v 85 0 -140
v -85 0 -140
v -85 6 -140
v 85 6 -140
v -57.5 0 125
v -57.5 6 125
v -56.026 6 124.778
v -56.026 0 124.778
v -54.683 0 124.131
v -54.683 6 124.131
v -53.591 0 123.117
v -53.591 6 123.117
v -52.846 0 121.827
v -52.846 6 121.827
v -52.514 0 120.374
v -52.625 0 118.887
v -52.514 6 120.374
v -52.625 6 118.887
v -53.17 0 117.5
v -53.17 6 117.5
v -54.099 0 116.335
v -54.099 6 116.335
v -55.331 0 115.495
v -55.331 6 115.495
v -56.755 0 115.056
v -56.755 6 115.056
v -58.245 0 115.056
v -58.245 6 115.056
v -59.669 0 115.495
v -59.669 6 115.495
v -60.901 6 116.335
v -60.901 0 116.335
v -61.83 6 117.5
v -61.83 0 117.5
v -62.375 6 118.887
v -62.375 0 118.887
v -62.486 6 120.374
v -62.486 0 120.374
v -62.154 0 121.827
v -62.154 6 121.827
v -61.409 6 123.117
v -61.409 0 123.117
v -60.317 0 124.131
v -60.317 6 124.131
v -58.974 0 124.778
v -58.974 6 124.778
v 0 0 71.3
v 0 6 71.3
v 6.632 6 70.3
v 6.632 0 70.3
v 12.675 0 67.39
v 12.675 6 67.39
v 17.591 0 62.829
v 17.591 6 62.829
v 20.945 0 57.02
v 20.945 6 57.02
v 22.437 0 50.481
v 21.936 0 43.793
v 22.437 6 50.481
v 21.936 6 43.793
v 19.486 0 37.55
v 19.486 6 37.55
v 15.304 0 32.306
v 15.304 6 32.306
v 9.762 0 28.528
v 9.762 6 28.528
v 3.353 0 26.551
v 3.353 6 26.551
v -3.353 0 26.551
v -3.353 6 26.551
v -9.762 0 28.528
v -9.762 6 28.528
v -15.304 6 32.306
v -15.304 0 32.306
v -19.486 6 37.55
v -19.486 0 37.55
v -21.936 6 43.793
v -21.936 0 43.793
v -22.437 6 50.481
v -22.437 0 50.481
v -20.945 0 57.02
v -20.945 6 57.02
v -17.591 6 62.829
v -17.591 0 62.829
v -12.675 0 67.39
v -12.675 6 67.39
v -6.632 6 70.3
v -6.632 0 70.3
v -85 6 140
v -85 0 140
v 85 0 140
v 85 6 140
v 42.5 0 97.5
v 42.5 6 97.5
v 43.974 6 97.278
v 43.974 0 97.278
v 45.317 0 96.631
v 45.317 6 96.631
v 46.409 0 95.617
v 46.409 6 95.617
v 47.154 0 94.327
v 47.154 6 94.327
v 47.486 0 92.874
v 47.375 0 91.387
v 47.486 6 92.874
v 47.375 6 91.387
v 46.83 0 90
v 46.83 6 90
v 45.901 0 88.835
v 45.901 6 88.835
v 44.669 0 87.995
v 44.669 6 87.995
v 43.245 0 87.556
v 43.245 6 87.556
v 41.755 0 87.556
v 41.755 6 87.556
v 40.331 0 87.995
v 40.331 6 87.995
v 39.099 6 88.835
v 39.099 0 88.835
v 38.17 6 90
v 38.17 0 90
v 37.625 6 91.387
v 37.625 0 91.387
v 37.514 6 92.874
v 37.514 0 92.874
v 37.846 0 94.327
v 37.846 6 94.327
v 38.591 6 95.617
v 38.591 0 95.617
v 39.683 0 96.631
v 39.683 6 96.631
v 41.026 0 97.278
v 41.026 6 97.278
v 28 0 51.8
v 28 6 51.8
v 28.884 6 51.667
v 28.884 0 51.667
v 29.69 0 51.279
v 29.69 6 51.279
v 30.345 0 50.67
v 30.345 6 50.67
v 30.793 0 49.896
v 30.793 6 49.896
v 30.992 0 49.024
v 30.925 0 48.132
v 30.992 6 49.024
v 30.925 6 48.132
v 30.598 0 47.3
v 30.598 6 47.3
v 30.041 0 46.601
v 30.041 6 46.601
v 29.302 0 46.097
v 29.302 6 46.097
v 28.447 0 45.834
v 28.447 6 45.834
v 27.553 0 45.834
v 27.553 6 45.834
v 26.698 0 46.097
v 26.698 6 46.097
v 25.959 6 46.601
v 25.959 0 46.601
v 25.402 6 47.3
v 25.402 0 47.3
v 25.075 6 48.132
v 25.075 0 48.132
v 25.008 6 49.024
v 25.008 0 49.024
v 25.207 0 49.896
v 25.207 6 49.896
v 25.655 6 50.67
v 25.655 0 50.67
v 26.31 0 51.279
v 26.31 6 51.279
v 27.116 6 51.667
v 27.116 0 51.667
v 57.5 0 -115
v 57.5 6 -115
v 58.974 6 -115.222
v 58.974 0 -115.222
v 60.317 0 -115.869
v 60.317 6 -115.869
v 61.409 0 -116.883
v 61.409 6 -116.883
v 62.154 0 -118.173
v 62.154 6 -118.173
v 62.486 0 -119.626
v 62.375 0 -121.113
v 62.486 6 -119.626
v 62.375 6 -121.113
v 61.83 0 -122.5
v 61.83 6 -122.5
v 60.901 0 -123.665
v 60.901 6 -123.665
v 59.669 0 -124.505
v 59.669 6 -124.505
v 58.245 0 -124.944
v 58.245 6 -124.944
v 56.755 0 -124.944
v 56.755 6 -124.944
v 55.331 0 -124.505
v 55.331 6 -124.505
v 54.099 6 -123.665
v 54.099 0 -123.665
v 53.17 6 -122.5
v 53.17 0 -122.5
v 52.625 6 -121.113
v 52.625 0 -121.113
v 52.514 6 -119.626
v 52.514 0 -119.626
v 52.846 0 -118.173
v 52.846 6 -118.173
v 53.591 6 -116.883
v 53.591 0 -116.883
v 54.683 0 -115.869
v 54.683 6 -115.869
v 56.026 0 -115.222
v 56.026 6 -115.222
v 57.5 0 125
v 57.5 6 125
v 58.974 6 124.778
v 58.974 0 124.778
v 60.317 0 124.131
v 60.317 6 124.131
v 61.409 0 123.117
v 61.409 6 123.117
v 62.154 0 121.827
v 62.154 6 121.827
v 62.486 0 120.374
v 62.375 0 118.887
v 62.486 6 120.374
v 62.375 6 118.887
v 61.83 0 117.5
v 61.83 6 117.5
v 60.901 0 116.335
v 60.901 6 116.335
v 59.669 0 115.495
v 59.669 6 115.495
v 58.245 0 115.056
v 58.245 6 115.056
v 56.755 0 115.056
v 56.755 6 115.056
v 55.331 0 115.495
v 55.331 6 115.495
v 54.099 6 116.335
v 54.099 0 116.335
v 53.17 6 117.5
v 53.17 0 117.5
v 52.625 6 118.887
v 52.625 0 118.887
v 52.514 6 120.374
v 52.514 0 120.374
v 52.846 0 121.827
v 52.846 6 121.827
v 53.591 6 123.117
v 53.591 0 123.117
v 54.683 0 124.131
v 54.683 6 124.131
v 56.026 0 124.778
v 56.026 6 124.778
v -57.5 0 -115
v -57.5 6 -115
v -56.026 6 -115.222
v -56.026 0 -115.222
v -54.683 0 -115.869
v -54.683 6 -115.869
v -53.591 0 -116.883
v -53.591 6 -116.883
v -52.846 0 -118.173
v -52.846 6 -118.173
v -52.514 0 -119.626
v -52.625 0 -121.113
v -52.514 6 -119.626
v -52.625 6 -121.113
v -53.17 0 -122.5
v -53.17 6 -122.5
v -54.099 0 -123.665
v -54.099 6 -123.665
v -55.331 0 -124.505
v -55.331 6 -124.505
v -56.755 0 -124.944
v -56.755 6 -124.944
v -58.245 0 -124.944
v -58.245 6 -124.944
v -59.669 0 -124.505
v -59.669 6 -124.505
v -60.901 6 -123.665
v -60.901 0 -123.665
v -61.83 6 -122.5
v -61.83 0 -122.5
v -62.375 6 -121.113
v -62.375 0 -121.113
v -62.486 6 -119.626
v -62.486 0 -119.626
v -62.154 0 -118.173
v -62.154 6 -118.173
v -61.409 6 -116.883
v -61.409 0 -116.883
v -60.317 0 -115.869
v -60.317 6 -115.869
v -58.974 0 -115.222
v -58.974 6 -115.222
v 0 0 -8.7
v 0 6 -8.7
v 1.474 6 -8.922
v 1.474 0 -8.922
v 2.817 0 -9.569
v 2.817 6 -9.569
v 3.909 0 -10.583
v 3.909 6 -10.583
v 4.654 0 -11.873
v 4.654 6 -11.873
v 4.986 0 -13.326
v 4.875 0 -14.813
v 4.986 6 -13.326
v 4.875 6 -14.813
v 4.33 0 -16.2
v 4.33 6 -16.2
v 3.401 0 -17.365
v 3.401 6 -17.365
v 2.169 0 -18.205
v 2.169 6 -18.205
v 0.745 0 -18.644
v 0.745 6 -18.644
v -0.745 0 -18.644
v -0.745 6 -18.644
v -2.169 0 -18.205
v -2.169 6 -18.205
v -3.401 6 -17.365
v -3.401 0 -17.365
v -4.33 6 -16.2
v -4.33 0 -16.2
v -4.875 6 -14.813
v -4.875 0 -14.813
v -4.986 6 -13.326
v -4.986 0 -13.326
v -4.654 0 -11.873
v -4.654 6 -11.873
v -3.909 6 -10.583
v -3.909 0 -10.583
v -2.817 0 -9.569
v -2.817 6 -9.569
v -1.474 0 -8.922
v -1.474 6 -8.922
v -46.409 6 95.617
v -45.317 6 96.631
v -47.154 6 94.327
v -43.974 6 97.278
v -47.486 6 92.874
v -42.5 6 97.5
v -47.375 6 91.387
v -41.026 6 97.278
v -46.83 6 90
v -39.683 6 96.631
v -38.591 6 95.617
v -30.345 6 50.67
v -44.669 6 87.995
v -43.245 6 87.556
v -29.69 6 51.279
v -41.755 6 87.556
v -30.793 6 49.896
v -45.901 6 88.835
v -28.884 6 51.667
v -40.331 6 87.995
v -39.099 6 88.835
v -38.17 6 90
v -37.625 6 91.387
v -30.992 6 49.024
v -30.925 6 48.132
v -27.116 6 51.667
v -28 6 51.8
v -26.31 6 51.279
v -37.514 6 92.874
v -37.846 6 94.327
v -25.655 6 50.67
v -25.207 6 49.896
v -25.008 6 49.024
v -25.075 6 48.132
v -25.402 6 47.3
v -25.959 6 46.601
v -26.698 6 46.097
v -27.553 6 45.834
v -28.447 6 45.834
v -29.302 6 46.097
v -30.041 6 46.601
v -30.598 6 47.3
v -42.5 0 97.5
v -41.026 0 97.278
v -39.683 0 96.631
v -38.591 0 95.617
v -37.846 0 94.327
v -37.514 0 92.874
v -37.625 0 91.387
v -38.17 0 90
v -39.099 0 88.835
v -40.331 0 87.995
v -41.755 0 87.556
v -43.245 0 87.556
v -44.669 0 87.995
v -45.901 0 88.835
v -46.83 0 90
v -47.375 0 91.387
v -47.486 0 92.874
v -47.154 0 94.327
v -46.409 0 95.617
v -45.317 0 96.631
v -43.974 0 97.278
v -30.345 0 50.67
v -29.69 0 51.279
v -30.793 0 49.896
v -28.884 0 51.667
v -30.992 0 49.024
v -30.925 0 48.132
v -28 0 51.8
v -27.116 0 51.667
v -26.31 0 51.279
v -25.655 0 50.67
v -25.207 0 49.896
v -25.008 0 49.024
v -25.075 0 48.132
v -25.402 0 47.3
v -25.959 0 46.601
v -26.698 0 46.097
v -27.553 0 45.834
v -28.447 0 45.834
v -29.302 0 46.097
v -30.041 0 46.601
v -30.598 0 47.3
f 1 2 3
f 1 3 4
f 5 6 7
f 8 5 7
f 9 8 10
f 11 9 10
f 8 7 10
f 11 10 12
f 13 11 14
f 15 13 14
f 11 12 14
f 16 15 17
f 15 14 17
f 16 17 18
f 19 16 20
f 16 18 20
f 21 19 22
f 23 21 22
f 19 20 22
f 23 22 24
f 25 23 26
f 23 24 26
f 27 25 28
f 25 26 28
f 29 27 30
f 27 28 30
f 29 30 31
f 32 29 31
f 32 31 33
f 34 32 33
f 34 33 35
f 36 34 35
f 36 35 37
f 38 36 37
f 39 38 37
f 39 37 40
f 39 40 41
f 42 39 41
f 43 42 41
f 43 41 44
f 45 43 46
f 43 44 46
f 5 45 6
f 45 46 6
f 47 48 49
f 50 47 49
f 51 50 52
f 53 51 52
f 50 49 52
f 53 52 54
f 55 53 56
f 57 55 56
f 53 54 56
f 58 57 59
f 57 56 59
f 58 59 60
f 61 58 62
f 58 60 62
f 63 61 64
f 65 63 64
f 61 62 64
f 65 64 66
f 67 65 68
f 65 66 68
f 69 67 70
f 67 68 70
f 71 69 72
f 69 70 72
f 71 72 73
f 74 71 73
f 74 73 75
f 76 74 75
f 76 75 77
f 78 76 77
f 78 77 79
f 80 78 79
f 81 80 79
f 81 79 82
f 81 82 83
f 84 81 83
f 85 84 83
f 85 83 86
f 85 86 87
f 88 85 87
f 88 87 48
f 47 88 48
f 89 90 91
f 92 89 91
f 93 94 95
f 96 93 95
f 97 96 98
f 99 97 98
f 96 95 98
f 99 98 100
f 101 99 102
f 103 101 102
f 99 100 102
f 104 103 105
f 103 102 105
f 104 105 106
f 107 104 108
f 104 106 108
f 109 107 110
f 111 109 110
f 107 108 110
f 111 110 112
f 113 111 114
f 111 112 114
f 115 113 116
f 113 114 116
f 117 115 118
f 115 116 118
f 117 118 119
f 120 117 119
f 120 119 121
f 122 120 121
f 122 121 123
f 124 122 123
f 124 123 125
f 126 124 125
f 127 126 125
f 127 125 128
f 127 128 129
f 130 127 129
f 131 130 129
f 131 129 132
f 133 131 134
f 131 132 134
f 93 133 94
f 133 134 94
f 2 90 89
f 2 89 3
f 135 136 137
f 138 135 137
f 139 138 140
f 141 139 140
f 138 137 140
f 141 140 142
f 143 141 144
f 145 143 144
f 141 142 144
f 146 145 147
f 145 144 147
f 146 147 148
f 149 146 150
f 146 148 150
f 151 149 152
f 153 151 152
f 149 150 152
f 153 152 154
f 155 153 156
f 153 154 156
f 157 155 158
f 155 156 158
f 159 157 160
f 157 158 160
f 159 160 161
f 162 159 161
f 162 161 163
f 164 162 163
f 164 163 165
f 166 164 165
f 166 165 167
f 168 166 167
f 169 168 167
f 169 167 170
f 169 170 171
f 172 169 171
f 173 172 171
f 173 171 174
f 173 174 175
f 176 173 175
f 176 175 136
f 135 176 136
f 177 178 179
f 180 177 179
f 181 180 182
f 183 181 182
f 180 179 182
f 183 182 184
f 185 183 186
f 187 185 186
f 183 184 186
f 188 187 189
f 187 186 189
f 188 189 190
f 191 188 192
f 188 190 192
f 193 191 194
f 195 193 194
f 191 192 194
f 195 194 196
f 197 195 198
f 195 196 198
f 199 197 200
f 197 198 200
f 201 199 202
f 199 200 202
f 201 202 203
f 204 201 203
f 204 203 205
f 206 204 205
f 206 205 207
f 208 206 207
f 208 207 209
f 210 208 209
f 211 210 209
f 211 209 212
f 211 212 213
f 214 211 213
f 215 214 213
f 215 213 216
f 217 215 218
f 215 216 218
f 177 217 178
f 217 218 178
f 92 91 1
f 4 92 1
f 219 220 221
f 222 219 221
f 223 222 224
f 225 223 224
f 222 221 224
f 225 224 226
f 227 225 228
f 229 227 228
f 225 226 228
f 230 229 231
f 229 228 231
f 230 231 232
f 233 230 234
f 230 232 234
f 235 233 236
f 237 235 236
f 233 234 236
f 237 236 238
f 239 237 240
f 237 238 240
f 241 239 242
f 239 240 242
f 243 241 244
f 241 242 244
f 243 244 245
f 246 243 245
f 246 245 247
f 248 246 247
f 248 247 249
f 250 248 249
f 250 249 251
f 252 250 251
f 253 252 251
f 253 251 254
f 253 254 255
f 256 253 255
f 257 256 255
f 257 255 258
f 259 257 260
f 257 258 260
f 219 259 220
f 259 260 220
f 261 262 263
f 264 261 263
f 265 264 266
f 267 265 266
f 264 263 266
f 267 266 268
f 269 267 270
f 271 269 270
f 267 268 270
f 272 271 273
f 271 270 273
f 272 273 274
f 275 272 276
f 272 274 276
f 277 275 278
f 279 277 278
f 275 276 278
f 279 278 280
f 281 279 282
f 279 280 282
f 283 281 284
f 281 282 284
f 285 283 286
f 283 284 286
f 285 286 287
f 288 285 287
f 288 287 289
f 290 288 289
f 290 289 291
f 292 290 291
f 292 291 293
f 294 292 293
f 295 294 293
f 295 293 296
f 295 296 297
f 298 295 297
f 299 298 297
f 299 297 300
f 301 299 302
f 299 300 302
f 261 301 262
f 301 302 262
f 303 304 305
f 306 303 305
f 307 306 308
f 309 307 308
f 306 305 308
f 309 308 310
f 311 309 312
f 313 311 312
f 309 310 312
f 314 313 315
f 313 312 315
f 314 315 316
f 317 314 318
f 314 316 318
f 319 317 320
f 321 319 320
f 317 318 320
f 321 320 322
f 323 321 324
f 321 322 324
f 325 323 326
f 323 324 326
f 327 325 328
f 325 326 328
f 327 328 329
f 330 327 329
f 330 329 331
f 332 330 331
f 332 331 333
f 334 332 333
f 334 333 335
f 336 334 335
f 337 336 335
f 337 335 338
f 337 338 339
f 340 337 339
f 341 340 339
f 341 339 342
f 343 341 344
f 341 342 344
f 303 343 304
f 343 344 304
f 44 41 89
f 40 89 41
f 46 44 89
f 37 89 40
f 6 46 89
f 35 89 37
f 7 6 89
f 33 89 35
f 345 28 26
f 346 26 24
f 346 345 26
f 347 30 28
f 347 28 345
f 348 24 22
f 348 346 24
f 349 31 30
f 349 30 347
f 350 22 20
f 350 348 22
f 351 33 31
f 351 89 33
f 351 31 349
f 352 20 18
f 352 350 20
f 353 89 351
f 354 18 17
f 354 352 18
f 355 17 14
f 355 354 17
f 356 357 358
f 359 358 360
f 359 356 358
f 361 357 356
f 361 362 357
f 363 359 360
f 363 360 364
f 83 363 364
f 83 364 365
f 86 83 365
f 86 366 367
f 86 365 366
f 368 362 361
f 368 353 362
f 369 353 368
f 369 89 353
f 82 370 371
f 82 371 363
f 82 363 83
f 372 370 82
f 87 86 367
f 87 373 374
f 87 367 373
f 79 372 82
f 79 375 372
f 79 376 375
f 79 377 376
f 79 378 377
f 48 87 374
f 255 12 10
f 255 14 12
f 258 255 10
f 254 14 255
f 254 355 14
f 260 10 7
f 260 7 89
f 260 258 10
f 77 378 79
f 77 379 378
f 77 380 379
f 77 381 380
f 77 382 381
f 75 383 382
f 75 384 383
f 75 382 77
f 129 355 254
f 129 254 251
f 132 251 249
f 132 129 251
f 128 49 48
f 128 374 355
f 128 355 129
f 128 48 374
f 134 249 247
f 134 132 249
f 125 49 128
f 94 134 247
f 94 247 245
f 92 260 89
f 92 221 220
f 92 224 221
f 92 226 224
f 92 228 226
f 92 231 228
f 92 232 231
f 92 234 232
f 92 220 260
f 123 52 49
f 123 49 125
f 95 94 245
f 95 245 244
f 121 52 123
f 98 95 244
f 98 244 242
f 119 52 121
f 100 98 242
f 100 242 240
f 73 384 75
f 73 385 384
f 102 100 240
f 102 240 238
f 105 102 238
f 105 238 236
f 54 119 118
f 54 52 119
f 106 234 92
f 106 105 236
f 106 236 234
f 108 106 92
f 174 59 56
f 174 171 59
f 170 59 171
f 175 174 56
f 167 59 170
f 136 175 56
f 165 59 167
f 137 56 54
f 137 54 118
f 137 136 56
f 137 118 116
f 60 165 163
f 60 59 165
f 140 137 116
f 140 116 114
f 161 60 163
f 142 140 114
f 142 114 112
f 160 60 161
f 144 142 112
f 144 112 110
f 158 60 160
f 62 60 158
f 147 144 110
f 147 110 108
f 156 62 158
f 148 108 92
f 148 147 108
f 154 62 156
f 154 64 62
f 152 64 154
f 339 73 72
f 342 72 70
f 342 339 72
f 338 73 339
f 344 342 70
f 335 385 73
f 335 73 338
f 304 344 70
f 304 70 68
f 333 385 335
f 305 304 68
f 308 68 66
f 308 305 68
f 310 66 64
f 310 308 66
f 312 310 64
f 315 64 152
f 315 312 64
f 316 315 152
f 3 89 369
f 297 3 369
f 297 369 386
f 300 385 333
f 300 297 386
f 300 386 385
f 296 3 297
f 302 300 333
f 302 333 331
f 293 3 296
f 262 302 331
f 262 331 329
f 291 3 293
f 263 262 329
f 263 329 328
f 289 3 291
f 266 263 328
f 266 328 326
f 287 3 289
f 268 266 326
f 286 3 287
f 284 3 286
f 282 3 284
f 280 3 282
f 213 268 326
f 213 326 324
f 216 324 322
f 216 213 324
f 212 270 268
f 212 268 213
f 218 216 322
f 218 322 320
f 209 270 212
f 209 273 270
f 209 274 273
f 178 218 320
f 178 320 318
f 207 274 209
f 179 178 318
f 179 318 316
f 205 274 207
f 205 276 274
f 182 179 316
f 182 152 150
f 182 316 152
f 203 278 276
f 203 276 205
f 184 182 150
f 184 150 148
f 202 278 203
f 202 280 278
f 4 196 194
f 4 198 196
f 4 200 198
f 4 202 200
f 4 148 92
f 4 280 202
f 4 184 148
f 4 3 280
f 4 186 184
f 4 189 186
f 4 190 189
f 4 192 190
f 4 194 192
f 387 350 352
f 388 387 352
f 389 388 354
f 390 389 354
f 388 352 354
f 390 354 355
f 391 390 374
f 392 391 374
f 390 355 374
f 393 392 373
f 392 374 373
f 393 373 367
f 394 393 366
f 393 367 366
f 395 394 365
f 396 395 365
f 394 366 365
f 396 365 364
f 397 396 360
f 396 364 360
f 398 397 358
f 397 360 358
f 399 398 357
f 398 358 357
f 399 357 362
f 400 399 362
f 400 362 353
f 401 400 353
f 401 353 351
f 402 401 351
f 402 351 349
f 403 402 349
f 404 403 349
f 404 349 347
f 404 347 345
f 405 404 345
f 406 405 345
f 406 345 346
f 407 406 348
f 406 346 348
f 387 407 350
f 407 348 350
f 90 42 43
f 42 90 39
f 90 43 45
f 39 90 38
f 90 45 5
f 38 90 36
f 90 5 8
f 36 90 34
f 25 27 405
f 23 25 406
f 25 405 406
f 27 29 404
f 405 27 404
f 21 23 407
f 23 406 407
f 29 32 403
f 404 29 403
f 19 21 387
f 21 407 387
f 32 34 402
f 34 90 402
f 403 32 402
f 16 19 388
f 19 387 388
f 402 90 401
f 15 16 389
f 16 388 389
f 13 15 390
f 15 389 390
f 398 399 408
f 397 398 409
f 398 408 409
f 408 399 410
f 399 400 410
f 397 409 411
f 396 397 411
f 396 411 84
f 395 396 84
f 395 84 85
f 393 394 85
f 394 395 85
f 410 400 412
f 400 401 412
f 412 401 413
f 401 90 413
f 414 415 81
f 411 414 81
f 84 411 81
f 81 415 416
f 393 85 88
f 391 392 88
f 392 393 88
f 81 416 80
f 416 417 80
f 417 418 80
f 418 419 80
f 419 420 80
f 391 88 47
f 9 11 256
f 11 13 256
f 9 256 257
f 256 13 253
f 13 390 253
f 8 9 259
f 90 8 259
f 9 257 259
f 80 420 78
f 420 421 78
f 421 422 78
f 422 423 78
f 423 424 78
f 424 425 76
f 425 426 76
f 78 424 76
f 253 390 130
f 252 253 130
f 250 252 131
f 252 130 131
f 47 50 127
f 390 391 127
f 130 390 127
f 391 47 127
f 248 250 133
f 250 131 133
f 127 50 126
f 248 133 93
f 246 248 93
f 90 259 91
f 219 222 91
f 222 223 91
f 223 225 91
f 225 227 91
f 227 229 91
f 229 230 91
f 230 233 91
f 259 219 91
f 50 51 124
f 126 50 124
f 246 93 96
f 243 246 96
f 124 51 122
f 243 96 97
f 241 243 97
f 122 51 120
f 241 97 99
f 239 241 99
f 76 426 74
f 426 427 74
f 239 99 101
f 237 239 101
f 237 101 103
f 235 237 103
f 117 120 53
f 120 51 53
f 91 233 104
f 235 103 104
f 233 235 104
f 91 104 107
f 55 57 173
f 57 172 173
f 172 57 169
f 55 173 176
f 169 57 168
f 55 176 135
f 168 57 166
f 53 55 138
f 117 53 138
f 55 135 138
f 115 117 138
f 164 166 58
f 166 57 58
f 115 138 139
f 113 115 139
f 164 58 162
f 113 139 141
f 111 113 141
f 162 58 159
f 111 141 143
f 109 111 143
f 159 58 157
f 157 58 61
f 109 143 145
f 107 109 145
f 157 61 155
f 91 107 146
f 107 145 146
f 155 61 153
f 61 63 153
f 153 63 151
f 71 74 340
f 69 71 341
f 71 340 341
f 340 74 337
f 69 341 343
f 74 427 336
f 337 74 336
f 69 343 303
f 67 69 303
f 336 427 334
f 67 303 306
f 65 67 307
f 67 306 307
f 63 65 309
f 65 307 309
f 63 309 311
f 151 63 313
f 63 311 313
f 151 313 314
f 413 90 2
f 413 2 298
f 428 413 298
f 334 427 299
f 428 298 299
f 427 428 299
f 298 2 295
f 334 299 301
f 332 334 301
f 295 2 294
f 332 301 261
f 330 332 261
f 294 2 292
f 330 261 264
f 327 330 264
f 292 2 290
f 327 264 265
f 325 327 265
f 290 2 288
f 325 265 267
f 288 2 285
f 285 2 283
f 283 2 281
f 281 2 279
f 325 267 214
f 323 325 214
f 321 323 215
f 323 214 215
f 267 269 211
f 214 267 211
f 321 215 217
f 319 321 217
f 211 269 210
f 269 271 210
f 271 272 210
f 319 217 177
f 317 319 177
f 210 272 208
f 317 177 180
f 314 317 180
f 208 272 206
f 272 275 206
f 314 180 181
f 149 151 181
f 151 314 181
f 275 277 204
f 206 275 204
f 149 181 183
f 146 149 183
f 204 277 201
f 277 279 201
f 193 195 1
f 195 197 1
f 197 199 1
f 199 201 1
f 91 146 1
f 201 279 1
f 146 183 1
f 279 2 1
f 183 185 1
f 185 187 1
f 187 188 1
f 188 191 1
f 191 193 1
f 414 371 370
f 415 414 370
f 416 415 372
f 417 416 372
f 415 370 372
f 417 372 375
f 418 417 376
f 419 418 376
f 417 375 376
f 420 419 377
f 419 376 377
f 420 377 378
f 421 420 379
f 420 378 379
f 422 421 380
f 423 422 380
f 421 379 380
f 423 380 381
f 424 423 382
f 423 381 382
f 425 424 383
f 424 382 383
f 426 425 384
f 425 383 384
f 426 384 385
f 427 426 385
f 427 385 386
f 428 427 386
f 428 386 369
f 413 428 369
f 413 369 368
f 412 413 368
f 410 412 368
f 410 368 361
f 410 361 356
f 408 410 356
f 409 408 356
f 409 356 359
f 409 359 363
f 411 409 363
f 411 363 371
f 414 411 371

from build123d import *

# Parameters (mm, degrees)
SKETCH1_W           = 170
SKETCH1_H           = 280
BOSS_EXTRUDE1_DEPTH = 6
SKETCH2_R           = 5
CUT_EXTRUDE1_DEPTH  = 6
SKETCH4_R           = 22.5
SKETCH4_R_2         = 3
CUT_EXTRUDE3_DEPTH  = 10


with BuildPart() as part:
    # Sketch1 → Boss-Extrude1 (new body)
    with BuildSketch(Plane(origin=(0, 0, 0), x_dir=(1, 0, 0), z_dir=(0, 1, 0))):
        Rectangle(SKETCH1_W, SKETCH1_H)
    extrude(amount=BOSS_EXTRUDE1_DEPTH)

    # Sketch2 → Cut-Extrude1 (cut)
    with BuildSketch(Plane(origin=(0, 6, 0), x_dir=(1, 0, 0), z_dir=(0, 1, 0))):
        with Locations((-57.5, 120)):
            Circle(SKETCH2_R)
        with Locations((57.5, 120)):
            Circle(SKETCH2_R)
        with Locations((0, 13.7)):
            Circle(SKETCH2_R)
        with Locations((-57.5, -120)):
            Circle(SKETCH2_R)
        with Locations((57.5, -120)):
            Circle(SKETCH2_R)
        with Locations((-42.5, -92.5)):
            Circle(SKETCH2_R)
        with Locations((42.5, -92.5)):
            Circle(SKETCH2_R)
    extrude(amount=-CUT_EXTRUDE1_DEPTH, mode=Mode.SUBTRACT)

    # Sketch4 → Cut-Extrude3 (cut)
    with BuildSketch(Plane(origin=(0, 6, 0), x_dir=(1, 0, 0), z_dir=(0, 1, 0))):
        with Locations((0, -48.8)):
            Circle(SKETCH4_R)
        with Locations((28, -48.8)):
            Circle(SKETCH4_R_2)
        with Locations((-28, -48.8)):
            Circle(SKETCH4_R_2)
    extrude(amount=-CUT_EXTRUDE3_DEPTH, mode=Mode.SUBTRACT)


solid = part.part
